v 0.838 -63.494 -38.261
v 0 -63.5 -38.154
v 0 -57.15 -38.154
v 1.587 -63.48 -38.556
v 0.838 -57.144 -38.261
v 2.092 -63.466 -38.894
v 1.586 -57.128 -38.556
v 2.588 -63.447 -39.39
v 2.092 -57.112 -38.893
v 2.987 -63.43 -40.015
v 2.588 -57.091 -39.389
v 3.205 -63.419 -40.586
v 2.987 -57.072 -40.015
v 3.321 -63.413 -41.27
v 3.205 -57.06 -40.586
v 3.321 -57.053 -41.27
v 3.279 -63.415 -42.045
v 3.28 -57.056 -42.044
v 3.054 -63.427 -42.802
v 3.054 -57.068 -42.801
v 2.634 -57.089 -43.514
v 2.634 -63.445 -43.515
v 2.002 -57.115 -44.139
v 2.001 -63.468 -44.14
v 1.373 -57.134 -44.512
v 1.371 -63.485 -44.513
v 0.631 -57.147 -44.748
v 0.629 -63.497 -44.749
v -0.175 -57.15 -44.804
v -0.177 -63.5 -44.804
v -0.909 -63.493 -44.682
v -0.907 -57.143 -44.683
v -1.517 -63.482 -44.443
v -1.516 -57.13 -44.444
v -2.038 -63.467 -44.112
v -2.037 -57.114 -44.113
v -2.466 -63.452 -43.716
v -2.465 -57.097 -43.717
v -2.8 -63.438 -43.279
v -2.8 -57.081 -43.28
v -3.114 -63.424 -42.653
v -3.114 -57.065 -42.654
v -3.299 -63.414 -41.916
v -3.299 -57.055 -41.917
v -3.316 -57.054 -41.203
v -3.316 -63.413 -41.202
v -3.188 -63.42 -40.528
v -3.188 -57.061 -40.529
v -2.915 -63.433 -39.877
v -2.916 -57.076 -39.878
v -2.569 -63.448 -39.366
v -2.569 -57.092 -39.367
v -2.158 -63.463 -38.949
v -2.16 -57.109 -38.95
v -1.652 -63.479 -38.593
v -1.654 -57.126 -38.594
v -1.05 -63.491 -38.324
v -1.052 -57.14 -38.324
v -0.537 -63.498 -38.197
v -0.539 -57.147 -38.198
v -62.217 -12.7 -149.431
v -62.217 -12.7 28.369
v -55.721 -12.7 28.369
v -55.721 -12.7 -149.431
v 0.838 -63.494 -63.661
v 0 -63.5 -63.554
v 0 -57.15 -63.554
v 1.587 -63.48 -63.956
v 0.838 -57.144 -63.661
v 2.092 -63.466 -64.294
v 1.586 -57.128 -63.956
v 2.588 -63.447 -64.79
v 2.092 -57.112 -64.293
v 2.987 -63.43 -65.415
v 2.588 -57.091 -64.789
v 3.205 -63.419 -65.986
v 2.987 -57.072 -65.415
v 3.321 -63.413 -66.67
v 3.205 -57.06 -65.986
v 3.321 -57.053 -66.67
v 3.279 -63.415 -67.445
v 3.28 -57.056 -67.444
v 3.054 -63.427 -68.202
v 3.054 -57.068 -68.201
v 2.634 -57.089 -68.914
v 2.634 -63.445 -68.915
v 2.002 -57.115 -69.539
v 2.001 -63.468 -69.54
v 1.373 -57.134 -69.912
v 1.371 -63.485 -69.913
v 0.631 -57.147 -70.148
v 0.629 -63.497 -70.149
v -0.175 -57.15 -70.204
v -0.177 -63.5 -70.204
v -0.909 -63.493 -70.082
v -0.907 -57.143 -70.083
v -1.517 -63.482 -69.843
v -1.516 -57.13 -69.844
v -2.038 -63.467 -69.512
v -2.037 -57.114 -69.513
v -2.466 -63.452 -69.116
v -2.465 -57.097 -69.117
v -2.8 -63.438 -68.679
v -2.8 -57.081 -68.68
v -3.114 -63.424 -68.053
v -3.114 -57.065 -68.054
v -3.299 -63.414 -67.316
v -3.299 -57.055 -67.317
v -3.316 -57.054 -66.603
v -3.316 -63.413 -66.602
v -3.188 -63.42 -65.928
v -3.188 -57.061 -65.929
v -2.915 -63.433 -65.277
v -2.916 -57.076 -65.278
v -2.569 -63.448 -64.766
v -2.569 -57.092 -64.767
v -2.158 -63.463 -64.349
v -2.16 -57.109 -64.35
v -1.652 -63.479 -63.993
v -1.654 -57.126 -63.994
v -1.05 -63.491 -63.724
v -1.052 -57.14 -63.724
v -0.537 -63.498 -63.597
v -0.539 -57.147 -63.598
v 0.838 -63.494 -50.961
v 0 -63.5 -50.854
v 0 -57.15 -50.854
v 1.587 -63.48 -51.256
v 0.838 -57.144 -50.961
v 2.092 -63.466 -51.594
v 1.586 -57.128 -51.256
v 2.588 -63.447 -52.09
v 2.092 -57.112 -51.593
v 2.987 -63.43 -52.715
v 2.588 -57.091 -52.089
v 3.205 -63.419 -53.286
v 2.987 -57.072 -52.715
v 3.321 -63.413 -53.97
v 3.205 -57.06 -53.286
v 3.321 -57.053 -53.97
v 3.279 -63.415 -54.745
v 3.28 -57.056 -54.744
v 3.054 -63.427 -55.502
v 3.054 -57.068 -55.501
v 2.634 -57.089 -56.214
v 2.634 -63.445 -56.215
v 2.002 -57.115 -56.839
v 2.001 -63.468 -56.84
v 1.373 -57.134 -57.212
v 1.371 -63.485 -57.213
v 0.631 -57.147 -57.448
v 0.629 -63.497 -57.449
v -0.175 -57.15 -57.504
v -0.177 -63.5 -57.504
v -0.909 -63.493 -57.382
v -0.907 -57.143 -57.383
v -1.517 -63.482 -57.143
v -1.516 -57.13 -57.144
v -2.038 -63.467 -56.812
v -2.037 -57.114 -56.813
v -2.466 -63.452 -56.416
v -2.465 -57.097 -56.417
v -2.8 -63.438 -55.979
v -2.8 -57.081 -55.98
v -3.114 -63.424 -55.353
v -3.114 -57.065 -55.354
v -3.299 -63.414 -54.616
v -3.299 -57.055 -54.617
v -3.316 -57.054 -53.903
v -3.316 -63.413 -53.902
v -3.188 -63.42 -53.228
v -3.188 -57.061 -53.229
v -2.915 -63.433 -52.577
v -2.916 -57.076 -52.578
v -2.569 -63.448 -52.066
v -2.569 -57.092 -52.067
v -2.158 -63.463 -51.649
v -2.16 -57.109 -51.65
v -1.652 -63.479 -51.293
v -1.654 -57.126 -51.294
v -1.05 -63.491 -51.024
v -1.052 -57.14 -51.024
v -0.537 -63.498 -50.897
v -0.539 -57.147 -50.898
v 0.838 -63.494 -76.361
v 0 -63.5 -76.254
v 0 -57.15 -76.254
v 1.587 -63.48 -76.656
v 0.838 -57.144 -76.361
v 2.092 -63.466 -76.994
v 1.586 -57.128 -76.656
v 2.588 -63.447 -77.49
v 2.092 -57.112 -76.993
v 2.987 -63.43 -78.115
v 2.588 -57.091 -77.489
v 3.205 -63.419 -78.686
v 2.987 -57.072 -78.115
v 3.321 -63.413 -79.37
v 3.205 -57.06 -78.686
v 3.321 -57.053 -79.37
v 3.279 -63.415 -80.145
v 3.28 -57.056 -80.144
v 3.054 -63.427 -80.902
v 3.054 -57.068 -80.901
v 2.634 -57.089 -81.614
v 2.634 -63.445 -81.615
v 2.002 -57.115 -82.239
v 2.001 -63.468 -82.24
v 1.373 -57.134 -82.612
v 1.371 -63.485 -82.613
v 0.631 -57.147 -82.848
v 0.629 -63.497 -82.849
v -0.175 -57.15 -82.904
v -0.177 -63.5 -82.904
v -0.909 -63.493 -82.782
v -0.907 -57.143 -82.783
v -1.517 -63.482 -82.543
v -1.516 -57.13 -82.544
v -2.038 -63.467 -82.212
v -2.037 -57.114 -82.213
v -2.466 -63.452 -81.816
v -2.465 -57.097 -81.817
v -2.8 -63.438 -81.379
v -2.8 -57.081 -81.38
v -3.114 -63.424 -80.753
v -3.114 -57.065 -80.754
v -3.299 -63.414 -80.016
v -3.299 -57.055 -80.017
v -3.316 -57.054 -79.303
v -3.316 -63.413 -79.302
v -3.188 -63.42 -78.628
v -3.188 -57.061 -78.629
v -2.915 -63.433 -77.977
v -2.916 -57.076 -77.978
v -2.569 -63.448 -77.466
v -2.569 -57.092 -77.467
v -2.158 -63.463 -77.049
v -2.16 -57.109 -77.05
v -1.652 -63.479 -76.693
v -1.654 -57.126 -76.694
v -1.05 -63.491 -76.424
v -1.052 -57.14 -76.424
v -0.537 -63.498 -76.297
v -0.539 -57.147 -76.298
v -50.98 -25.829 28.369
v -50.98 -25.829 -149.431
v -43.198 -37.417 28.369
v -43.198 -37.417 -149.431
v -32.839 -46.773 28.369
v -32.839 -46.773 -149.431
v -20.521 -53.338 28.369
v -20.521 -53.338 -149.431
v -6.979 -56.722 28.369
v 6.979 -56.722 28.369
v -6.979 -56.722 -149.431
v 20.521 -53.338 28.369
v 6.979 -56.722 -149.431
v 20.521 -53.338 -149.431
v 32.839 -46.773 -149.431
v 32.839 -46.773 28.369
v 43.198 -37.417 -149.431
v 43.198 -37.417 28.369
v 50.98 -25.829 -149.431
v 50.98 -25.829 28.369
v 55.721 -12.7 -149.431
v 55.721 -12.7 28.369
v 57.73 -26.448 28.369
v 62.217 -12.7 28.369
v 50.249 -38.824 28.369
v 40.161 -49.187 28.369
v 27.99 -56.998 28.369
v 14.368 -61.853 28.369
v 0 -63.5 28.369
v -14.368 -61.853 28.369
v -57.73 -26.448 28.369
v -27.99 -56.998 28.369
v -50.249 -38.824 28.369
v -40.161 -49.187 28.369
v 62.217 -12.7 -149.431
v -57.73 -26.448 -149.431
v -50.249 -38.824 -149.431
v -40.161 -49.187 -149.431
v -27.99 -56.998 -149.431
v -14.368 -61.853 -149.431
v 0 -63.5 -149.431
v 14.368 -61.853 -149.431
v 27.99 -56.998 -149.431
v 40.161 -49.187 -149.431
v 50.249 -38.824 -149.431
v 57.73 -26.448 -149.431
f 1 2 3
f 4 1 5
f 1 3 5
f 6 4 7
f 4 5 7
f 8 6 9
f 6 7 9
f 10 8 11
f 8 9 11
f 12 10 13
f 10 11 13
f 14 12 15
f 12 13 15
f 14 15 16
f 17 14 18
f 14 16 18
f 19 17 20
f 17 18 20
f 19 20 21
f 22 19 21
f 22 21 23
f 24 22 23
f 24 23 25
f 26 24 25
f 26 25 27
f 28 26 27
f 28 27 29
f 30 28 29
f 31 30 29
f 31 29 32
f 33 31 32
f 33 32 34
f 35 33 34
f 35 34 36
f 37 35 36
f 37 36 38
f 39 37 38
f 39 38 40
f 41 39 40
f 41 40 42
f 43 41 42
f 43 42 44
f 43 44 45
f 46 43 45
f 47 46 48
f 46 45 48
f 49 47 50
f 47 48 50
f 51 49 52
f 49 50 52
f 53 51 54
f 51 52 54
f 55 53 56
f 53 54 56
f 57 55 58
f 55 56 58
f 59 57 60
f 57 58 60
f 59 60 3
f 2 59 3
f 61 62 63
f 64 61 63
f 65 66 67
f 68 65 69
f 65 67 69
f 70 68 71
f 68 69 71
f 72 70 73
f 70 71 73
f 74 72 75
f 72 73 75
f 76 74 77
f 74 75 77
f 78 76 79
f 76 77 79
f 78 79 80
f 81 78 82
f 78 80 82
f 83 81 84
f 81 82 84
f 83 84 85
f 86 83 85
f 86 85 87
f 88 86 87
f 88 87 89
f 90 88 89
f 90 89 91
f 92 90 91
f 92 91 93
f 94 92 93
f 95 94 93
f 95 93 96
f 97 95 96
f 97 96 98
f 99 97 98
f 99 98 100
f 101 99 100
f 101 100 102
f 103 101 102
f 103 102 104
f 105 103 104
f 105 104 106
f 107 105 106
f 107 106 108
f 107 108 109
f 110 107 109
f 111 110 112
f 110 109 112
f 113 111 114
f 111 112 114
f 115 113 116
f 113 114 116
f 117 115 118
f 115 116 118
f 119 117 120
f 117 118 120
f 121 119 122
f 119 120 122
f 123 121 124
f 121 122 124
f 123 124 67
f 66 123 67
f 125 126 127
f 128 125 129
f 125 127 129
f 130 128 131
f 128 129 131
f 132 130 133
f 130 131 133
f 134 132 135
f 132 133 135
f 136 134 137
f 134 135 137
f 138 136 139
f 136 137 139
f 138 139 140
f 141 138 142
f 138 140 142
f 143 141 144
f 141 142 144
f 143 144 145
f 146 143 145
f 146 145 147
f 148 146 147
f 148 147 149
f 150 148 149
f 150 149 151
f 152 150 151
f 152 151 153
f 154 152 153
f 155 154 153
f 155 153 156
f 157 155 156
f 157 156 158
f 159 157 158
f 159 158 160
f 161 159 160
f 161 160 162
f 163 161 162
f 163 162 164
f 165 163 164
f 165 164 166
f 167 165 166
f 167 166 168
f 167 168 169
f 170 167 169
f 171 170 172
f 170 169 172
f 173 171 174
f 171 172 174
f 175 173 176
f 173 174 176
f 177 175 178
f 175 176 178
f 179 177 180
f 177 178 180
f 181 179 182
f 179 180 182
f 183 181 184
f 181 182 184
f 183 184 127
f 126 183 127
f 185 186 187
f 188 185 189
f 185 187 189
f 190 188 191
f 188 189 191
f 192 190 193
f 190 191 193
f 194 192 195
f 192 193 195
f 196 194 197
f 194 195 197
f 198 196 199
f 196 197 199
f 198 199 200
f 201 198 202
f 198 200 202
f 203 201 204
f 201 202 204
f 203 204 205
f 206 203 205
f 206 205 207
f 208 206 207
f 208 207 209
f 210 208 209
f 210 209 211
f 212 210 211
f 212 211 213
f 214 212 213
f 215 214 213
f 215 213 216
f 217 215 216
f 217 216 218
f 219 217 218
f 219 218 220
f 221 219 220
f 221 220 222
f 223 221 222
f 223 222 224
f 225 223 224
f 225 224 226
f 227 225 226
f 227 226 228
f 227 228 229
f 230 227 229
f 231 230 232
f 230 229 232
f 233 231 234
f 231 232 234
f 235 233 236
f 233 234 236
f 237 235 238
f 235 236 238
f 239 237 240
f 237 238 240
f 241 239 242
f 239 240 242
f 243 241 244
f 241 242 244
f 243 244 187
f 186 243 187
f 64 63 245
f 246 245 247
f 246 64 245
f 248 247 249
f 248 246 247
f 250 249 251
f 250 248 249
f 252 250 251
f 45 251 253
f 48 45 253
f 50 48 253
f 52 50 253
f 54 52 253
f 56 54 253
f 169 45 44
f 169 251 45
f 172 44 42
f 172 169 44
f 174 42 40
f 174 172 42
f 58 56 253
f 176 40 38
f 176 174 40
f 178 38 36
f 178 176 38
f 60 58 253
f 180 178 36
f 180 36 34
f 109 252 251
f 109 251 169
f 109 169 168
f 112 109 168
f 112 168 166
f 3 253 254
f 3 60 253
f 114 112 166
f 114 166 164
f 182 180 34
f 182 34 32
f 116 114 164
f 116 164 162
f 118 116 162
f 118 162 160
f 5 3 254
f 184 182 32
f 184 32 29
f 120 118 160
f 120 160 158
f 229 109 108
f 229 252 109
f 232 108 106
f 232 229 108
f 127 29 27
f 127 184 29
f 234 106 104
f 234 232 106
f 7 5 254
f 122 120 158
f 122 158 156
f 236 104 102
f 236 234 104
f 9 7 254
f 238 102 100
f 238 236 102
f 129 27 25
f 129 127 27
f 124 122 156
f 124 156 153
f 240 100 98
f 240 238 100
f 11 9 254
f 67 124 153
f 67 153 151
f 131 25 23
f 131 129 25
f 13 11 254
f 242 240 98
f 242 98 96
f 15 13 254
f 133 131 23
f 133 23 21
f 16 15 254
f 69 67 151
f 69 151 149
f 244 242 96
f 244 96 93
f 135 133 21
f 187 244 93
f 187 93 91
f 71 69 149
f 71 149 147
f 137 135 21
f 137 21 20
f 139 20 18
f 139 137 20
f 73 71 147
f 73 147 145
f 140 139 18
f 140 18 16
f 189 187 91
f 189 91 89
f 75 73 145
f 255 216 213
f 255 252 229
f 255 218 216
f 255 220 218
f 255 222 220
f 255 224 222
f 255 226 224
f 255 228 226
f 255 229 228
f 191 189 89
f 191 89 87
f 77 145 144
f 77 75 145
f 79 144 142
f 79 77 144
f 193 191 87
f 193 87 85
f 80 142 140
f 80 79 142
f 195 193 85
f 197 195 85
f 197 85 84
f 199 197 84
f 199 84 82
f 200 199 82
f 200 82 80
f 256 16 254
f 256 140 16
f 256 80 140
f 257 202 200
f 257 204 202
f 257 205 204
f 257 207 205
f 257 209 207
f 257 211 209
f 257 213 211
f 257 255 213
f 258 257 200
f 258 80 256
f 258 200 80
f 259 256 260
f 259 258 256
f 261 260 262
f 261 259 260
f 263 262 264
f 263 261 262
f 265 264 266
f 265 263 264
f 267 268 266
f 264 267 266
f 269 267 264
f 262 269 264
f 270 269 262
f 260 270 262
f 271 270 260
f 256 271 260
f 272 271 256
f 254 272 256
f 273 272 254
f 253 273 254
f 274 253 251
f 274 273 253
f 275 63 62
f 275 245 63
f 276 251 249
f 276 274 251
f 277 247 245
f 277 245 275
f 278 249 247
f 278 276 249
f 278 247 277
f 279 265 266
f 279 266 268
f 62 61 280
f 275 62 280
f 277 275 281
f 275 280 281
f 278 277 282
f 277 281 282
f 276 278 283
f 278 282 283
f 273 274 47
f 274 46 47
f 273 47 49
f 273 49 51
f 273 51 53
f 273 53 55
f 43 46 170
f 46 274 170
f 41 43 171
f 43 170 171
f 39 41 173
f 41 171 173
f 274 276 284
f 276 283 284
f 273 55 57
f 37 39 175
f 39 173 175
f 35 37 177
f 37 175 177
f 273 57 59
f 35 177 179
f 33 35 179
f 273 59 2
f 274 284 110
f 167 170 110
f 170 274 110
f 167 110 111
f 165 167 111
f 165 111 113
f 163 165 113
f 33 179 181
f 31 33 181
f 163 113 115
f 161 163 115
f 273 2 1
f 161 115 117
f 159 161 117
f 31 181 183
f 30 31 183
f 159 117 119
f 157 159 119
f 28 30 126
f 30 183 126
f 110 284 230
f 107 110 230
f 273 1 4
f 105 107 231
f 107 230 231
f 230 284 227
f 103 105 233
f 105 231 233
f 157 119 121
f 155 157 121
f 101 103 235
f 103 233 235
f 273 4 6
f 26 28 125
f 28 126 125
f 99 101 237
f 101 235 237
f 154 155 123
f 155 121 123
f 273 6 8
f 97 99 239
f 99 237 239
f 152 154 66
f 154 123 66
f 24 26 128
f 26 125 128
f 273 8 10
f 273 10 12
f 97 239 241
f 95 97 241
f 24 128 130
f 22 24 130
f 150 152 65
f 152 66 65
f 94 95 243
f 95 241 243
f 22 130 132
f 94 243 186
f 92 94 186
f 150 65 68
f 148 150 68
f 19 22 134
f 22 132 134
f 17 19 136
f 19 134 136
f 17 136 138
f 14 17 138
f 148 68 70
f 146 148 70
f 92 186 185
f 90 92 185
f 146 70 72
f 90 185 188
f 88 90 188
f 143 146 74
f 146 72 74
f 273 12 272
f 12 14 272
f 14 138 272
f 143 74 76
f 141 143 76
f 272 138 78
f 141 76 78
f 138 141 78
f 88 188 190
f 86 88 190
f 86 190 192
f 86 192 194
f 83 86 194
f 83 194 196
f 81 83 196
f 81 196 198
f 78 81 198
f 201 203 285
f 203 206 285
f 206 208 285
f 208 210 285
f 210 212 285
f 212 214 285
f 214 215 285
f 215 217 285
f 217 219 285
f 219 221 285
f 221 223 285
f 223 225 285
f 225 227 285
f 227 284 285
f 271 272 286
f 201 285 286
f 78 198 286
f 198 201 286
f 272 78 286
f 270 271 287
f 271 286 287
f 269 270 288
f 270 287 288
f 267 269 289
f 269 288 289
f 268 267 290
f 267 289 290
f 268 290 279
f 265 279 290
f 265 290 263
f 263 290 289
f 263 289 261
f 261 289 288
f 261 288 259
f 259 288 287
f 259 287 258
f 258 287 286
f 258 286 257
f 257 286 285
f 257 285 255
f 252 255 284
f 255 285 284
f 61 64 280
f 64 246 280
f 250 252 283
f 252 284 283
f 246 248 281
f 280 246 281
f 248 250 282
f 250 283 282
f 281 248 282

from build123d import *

# Parameters (mm, degrees)
SKETCH2_W          = 177.8
SKETCH2_H          = 6.35
REVOLVE1_ANGLE     = 180
SKETCH3_R          = 3.327499949
CUT_EXTRUDE1_DEPTH = 175.339362144
CUT_EXTRUDE2_DEPTH = 200.191716848


with BuildPart() as part:
    # Sketch2 → Revolve1 (revolve)
    with BuildSketch(Plane(origin=(0, 0, 0), x_dir=(0, 0, -1), z_dir=(0, -1, 0))):
        with Locations((60.53129924, -60.325)):
            Rectangle(SKETCH2_W, SKETCH2_H)
    revolve(axis=Axis((0, 0, 0), (0, 0, 1)), revolution_arc=REVOLVE1_ANGLE)

    # Sketch3 → Cut-Extrude1 (cut, through all)
    with BuildSketch(Plane(origin=(0, 0, 0), x_dir=(1, 0, 0), z_dir=(0, 1, 0))):
        with Locations(Location((0, 66.88129924, 0), (0, 0, 270))):
            Circle(SKETCH3_R)
        with Locations(Location((0, 54.18129924, 0), (0, 0, 270))):
            Circle(SKETCH3_R)
        with Locations(Location((0, 79.58129924, 0), (0, 0, 270))):
            Circle(SKETCH3_R)
        with Locations(Location((0, 41.48129924, 0), (0, 0, 270))):
            Circle(SKETCH3_R)
    extrude(amount=-CUT_EXTRUDE1_DEPTH, mode=Mode.SUBTRACT)

    # Sketch4 → Cut-Extrude2 (cut, through all)
    with BuildSketch(Plane.XY.offset(28.36870076)):
        with BuildLine():
            Line((-81.567226875, -12.7), (81.567226875, -12.7))
            ThreePointArc((81.567226875, -12.7), (0, 82.55), (-81.567226875, -12.7))
        make_face()
    extrude(amount=-CUT_EXTRUDE2_DEPTH, mode=Mode.SUBTRACT)


solid = part.part
